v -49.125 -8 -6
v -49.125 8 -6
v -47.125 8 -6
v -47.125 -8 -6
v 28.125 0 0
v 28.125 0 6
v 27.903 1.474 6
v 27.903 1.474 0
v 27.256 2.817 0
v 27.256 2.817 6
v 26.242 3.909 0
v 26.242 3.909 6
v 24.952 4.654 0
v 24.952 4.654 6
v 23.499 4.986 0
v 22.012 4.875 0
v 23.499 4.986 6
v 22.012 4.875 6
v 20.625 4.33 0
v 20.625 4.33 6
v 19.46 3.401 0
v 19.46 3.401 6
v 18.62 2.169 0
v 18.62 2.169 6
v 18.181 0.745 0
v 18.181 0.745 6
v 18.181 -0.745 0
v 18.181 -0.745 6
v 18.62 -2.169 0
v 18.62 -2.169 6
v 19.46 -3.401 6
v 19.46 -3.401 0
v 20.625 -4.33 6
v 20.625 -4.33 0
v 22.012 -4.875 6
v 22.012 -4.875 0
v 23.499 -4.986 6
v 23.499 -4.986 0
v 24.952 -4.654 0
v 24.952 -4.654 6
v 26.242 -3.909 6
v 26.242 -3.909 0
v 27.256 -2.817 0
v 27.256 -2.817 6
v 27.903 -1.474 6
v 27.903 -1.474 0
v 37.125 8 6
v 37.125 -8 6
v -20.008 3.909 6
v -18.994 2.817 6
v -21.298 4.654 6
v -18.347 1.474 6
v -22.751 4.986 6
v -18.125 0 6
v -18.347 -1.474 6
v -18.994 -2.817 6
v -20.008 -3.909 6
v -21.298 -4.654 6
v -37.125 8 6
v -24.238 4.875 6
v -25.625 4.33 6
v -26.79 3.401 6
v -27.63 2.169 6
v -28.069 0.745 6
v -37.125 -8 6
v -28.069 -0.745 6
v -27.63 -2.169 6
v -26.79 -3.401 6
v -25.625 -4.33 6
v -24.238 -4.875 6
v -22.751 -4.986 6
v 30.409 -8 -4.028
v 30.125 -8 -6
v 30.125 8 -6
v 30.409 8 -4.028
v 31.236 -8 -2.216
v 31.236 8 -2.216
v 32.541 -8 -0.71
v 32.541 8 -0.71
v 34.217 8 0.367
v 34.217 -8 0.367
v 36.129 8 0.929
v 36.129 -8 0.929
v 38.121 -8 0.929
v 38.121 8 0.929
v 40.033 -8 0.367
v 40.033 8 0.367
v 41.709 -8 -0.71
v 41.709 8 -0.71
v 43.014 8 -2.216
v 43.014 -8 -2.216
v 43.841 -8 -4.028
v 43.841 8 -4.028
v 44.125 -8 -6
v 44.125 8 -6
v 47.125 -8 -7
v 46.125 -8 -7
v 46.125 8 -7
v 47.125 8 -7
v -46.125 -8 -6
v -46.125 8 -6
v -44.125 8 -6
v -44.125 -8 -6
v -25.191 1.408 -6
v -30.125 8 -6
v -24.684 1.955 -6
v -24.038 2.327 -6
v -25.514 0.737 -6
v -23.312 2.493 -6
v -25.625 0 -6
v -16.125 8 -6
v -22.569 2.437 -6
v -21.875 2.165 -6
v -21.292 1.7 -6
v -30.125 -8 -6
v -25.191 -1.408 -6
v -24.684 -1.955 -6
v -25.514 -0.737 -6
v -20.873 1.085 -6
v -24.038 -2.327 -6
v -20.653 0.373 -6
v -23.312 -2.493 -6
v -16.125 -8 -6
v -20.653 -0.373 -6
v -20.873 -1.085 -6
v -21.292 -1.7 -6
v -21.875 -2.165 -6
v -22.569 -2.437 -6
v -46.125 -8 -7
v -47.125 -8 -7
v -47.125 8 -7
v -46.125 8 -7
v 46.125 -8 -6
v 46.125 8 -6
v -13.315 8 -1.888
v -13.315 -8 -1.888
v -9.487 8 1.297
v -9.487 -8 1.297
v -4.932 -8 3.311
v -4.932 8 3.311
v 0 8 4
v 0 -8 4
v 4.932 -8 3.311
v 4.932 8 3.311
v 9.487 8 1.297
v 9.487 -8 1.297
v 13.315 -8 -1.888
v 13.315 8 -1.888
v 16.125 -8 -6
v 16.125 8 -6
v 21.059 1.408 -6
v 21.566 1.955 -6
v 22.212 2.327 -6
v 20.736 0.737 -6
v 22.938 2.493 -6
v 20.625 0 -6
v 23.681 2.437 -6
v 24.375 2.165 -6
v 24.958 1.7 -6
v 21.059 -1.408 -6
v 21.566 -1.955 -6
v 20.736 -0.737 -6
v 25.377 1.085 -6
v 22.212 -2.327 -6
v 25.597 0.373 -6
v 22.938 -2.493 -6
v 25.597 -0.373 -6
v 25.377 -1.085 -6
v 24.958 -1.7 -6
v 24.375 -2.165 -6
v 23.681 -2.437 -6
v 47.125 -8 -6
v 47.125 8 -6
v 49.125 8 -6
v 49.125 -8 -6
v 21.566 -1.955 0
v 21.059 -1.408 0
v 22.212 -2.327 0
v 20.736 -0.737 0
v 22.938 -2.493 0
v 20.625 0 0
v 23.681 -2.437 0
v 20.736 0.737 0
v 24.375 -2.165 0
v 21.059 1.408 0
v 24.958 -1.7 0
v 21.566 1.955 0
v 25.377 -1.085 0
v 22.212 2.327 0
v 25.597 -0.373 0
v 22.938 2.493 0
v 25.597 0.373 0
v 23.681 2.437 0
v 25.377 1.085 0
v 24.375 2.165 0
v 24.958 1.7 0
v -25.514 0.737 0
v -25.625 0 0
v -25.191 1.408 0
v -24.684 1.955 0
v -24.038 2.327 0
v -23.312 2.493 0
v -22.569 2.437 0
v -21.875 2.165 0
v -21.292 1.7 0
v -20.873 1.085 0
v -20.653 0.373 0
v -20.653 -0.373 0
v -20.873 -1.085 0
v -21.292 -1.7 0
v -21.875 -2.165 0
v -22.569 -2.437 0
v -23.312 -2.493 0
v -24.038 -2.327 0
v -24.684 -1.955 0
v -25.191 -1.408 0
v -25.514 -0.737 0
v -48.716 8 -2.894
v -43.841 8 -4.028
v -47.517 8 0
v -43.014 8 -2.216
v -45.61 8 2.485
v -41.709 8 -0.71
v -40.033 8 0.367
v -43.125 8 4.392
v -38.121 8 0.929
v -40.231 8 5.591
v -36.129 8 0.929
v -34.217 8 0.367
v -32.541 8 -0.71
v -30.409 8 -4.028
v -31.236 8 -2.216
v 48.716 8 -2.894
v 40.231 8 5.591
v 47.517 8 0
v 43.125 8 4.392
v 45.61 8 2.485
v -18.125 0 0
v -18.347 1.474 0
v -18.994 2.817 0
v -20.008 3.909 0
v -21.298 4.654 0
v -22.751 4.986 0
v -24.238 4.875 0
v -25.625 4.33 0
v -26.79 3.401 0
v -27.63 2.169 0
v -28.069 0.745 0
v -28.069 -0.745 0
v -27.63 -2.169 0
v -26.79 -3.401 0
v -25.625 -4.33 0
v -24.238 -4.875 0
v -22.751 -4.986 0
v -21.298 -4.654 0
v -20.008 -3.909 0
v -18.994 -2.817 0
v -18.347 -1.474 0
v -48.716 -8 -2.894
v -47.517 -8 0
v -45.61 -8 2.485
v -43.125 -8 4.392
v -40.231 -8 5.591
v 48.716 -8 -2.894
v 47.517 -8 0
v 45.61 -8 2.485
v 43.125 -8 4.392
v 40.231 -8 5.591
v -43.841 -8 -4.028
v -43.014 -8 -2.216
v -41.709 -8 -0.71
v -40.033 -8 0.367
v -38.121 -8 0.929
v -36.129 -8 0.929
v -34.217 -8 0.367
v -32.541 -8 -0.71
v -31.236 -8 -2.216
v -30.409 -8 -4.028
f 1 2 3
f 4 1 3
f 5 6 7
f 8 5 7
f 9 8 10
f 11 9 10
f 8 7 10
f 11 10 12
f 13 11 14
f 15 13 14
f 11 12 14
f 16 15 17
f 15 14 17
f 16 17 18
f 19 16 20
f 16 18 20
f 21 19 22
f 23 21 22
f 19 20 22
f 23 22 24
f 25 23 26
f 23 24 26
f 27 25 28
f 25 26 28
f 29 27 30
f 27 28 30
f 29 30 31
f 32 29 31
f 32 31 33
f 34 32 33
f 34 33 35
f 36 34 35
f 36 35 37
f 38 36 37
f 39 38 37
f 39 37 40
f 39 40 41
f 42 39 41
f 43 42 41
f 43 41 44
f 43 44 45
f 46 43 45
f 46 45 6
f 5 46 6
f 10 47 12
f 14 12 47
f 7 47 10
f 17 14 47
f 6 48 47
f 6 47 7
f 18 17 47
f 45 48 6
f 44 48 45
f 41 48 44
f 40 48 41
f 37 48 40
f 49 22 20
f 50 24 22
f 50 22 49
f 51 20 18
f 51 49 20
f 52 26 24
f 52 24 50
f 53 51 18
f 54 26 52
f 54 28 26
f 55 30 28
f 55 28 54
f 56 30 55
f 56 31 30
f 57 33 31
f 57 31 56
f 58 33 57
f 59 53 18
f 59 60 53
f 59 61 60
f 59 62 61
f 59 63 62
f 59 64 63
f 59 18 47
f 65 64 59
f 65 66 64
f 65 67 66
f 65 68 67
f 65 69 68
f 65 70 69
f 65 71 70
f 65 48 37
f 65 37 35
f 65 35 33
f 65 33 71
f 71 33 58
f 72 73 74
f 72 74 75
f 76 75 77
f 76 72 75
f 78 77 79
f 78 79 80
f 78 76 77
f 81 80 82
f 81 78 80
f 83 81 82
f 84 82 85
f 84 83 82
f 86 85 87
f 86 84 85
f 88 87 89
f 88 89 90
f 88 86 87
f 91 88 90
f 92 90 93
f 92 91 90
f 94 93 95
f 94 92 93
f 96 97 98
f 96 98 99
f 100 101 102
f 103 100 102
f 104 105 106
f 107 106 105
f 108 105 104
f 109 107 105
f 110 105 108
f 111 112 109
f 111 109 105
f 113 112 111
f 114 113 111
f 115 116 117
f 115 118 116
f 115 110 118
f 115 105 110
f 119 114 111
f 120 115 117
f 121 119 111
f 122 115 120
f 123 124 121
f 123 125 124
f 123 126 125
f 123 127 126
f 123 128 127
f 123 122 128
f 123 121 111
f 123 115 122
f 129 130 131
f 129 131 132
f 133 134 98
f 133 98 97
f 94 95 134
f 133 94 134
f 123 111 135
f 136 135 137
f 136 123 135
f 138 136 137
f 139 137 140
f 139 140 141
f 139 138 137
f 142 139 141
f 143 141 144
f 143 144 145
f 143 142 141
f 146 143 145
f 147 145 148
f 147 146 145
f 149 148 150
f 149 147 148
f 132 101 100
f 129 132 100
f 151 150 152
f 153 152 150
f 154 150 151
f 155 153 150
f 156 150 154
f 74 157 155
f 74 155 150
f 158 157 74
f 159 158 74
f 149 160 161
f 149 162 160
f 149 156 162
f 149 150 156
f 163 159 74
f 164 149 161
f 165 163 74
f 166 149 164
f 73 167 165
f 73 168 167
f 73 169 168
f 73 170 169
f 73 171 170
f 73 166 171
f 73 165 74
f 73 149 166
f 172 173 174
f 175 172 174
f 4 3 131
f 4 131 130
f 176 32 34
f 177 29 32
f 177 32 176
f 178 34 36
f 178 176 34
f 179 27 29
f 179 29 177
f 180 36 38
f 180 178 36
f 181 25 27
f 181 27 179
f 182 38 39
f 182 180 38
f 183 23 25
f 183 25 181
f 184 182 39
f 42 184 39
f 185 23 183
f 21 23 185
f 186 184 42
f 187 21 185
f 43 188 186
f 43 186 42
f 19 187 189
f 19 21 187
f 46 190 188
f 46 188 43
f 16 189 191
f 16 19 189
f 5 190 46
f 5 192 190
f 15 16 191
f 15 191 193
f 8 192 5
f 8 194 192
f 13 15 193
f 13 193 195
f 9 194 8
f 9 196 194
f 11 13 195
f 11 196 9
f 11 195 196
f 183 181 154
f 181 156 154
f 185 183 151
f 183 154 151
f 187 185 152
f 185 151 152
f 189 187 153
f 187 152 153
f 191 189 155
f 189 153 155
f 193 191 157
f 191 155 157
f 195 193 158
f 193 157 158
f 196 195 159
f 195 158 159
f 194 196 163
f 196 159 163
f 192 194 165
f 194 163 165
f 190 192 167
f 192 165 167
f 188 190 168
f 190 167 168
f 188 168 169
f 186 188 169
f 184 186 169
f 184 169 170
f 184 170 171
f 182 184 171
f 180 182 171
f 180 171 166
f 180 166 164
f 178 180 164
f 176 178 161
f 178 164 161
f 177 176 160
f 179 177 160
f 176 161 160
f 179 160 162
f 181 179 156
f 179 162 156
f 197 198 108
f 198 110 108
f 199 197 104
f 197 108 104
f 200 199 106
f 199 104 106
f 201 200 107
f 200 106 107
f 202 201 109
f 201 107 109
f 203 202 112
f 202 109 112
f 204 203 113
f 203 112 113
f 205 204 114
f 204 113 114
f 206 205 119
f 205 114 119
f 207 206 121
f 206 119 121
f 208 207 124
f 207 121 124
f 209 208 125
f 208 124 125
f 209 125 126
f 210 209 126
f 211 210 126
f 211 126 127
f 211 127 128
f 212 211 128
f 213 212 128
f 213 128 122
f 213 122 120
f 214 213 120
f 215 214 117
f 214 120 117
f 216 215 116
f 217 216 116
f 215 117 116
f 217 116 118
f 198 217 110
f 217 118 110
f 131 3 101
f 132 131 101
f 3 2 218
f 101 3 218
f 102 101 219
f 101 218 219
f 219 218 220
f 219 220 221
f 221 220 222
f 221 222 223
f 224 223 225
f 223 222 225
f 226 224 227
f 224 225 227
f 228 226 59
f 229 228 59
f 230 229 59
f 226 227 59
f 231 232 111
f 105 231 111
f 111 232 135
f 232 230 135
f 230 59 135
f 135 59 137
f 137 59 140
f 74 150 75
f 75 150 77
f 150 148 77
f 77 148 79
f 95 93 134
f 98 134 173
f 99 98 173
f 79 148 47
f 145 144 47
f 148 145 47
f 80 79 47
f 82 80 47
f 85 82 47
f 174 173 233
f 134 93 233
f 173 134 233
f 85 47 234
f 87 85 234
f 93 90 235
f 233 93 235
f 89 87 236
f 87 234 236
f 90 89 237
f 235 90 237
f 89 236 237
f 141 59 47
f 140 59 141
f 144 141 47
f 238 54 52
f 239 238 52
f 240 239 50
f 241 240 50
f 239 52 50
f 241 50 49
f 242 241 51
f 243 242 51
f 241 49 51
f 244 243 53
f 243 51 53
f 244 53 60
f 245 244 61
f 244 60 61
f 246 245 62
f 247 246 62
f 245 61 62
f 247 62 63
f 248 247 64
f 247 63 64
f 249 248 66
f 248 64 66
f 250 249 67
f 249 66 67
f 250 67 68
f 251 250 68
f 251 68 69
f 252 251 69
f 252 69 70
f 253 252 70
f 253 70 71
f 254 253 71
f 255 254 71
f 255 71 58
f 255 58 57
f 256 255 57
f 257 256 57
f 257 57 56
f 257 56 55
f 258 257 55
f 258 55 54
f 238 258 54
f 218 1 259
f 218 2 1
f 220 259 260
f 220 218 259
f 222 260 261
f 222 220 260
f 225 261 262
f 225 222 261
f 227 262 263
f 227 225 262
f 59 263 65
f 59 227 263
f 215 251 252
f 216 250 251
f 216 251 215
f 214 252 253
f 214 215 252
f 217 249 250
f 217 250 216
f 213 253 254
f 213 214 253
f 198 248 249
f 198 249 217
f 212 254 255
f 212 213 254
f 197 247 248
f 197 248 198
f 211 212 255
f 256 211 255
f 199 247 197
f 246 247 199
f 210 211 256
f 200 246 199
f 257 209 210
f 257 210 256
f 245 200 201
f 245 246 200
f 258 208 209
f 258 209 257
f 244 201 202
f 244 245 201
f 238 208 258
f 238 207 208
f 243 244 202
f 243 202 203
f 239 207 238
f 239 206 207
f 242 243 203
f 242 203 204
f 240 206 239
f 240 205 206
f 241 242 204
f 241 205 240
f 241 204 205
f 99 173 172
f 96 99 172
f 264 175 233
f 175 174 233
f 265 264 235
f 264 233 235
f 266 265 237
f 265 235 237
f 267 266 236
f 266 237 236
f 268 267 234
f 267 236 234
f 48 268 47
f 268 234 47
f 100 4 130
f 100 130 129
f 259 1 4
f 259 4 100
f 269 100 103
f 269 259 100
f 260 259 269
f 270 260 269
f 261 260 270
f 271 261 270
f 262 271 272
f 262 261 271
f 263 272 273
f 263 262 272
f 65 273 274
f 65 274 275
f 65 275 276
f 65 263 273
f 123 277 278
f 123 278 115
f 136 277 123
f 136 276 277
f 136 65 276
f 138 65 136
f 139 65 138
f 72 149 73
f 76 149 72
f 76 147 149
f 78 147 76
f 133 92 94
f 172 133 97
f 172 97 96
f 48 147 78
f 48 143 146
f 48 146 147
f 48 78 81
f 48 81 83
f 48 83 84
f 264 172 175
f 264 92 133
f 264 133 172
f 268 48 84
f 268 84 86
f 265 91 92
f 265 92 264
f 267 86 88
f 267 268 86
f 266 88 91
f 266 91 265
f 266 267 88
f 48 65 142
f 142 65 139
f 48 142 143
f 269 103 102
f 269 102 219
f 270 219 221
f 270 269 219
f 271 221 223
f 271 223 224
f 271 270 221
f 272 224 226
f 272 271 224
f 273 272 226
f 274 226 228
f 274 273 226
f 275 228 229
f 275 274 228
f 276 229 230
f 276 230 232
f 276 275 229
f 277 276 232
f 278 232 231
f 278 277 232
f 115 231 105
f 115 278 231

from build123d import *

# Parameters (mm, degrees)
F1_DEPTH       = 8
F3_D           = 5
F3_CBORE_D     = 10
F3_CBORE_DEPTH = 6
F4_R           = 11.99999
F5_W           = 1
F5_H           = 16
F6_DEPTH       = 1
F7_W           = 1
F7_H           = 16
F8_DEPTH       = 1


# Not quite as in the source:
# - a fillet or chamfer is up to 0.001 mm smaller than in the source, because OpenCascade refuses the exact size
# - a feature names something its author has since deleted; it is built from what else it names


with BuildPart() as f1:
    # F0 (on Front) → F1 (new body, symmetric)
    with BuildSketch(Plane.XZ):
        with BuildLine():
            Line((-49.125, -6), (-44.125, -6))
            ThreePointArc((-44.125, -6), (-37.125, 1), (-30.125, -6))
            Line((-30.125, -6), (-16.1245154966, -6))
            ThreePointArc((-16.1245154966, -6), (0, 4), (16.1245154966, -6))
            Line((16.1245154966, -6), (30.125, -6))
            ThreePointArc((30.125, -6), (37.125, 1), (44.125, -6))
            Line((44.125, -6), (49.125, -6))
            Line((49.125, -6), (49.125, 6))
            Line((49.125, 6), (-49.125, 6))
            Line((-49.125, 6), (-49.125, -6))
        make_face()
    extrude(amount=F1_DEPTH, both=True)

    # F3 (through all)
    with Locations(Plane.XY.offset(6)):
        with Locations((-23.125, 0), (23.125, 0)):
            CounterBoreHole(F3_D / 2, F3_CBORE_D / 2, F3_CBORE_DEPTH)

    # F4 (radius 12 in the source; OpenCascade refuses exactly that, so slightly less here)
    f4_edges = [f1.edges().sort_by_distance(p)[0] for p in [
        (49.125, 0, 6),
        (-49.125, 0, 6),
    ]]
    fillet(f4_edges, radius=F4_R)

    # F5 (on face) → F6 (join)
    with BuildSketch(Plane(origin=(0, 0, -6), x_dir=(1, 0, 0), z_dir=(0, 0, -1))):
        with Locations((-46.625, 0)):
            Rectangle(F5_W, F5_H)
    extrude(amount=F6_DEPTH)

    # F7 (on face) → F8 (join)
    with BuildSketch(Plane(origin=(0, 0, -6), x_dir=(1, 0, 0), z_dir=(0, 0, -1))):
        with Locations((46.625, 0)):
            Rectangle(F7_W, F7_H)
    extrude(amount=F8_DEPTH)


solid = f1.part
